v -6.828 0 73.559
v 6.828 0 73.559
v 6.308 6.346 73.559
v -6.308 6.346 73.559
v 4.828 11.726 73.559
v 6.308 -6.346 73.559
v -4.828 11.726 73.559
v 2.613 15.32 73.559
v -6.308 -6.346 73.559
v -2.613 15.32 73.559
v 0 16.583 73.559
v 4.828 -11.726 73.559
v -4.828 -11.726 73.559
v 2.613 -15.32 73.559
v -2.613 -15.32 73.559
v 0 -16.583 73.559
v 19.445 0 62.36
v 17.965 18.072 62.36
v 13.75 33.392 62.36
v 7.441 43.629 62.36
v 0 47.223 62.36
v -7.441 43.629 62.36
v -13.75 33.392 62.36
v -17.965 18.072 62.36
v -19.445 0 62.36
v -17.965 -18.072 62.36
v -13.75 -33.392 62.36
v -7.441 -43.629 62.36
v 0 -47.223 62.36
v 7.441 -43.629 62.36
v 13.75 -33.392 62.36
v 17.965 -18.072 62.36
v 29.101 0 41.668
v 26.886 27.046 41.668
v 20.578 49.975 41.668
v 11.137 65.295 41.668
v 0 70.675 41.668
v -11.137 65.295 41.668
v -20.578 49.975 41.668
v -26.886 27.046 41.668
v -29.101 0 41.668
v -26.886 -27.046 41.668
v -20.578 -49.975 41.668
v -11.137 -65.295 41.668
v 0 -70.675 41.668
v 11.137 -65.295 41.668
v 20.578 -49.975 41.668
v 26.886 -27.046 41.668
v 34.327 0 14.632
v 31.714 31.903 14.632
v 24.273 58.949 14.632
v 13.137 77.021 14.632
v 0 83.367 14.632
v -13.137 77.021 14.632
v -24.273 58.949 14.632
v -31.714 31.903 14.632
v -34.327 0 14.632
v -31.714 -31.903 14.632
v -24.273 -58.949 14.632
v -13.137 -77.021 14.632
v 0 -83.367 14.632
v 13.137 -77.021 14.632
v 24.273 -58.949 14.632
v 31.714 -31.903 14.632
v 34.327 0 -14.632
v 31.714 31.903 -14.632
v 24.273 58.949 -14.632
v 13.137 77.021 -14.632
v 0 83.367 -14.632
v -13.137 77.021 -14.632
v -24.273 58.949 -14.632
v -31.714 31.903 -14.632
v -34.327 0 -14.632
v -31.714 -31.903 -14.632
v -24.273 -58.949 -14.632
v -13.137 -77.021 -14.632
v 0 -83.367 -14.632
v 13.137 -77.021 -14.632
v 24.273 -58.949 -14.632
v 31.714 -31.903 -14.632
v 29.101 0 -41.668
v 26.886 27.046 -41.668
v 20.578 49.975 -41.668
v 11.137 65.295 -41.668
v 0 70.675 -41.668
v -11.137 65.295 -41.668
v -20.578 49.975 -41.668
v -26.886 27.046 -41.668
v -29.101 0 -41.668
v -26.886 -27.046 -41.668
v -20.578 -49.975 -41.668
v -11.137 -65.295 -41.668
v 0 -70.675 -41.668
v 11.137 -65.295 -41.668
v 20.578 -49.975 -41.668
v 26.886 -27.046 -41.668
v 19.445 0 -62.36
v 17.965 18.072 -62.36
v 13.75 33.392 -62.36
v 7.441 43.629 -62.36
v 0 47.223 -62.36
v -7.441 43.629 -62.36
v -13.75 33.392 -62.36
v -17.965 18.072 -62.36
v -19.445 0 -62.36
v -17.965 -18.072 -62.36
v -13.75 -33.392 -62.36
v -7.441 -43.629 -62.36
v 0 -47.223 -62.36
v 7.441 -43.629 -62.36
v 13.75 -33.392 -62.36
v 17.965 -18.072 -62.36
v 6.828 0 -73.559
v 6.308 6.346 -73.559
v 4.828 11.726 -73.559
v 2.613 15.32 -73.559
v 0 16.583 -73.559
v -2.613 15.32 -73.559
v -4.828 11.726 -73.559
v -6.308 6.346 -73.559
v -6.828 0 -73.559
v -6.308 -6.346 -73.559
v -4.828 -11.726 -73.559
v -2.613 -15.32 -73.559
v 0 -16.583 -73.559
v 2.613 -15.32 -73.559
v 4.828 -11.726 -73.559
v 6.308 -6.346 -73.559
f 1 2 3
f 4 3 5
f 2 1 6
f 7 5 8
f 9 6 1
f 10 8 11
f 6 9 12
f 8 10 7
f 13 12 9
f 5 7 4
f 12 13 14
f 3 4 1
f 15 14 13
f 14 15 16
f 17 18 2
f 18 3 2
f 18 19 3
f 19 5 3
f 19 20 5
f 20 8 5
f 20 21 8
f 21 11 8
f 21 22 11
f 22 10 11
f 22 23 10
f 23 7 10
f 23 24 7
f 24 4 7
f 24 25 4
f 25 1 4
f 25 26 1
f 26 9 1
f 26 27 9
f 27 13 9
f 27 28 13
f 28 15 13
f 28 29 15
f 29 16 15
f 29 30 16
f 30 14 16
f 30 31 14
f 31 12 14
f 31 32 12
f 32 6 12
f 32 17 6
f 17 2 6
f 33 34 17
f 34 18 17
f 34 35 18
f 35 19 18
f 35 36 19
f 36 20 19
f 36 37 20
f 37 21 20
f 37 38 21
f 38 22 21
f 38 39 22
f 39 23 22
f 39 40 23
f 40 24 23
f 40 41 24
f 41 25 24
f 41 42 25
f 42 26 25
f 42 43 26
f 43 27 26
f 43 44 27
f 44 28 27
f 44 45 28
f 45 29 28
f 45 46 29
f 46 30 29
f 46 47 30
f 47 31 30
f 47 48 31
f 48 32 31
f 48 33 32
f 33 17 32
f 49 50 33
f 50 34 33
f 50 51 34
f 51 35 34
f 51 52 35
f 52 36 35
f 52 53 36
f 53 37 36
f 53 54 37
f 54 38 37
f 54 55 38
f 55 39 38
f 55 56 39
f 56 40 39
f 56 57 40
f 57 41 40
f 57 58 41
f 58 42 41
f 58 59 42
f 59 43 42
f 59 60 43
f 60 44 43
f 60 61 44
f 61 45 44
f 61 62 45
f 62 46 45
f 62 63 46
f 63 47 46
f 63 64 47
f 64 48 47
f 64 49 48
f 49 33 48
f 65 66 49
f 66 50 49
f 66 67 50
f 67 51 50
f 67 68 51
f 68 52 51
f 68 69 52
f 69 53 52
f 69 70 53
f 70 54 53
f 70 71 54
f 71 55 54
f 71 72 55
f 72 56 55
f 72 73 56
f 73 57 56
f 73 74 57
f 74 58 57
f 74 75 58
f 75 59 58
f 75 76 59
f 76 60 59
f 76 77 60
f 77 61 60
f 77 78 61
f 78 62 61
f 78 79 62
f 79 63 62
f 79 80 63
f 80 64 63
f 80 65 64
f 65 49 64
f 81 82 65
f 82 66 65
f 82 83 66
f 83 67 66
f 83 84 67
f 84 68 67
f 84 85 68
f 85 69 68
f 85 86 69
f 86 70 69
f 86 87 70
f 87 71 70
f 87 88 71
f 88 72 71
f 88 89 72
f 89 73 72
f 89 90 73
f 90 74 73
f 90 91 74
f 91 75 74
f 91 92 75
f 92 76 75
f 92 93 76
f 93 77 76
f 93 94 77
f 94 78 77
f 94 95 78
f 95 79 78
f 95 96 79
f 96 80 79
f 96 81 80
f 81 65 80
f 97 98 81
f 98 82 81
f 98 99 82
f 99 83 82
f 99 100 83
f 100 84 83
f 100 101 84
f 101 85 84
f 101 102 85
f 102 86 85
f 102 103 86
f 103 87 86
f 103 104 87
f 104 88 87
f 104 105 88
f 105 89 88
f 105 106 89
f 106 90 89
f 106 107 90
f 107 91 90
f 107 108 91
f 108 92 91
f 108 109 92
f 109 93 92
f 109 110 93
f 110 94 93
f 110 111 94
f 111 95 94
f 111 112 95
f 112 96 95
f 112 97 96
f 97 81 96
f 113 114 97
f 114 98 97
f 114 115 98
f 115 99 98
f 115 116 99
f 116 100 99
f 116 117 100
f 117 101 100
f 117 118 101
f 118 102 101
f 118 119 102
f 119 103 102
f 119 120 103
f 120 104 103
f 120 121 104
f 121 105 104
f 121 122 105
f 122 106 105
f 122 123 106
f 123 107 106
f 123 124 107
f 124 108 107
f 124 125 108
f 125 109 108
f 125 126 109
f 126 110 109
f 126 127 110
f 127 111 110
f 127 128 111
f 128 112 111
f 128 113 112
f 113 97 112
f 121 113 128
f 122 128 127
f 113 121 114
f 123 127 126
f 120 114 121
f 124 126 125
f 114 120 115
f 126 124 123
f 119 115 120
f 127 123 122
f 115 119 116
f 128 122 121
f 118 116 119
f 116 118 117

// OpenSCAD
// Generated by SolidPython 1.0.1 on 2020-07-29 00:46:48


scale(v = [7, 17, 15]) {
	sphere(r = 5);
}
/***********************************************
*********      SolidPython code:      **********
************************************************
 
# import packages: SolidPython
from solid import *
from solid.utils import *
from itertools import chain, combinations, permutations


class Resize:

    def __init__(self, scad_file):
        self.scad_file = scad_file
        #self.scad_file = import_scad(scad_file)
        # cone/cylinder param:
        self.r1 = 0
        self.r2 = 0
        self.h = 0
        # rectangular prism param:
        self.w = 0
        self.l = 0
        # ellipse param:
        self.r = 0

    # import OpenScad code (file name corresponds to shape)


    # classify shape + parameters
    def assign(self, param1, param2, param3):
        if self.scad_file == 'cone.scad':
            self.r1 = param1
            self.r2 = param2
            self.h = param3
        elif self.scad_file == 'cylinder.scad':
            self.r1 = param1
            self.r2 = param2
            self.h = param3
        elif self.scad_file == 'rectangularPrism.scad':
            self.h = param1
            self.l = param2
            self.w = param3
        else:
            self.r = param1
            self.h = param2

    # resize parameters
    def iterate(self):
        x = range(3, 20, 2)
        i = 1
        if self.scad_file == 'cone.scad':
            tempList = list(permutations(x, 2))
            for temp in tempList:
                param1 = temp[0]
                param2 = temp[1]
                filepath = 'produced_scad_files/' + 'cone' + str(param1) + '_' + str(param2) + '_' + '.scad'
                scad_render_to_file(cylinder(h=param1, r1=param2, r2=0), filepath)

        elif self.scad_file == 'cylinder.scad':
            tempList = list(permutations(x, 3))
            for temp in tempList:
                param1 = temp[0]
                param2 = temp[1]
                filepath = 'produced_scad_files/' + 'cylinder' + str(param1) + '_' + str(param2) + '_' + '.scad'
                scad_render_to_file(cylinder(h=param1, r1=param2, r2=param2), filepath)

        elif self.scad_file == 'rectangularPrism.scad':
            tempList = list(permutations(x, 3))
            for temp in tempList:
                param1 = temp[0]
                param2 = temp[1]
                param3 = temp[2]
                filepath = 'produced_scad_files/' + 'rectangularPrism' + str(param1) + '_' + str(param2) + '_' + str(
                    param3) + '.scad'
                scad_render_to_file(cube(size=(param1, param2, param3)), filepath)

        elif self.scad_file == 'ellipse.scad':
            tempList = list(permutations(x, 4))
            for temp in tempList:
                param1 = temp[0]
                param2 = temp[1]
                param3 = temp[2]
                param4 = temp[3]
                filepath = 'produced_scad_files/' + 'ellipse' + str(param1) + '_' + str(param2) + '_' + str(param3) + '_' + str(param4) + '.scad'
                scad_render_to_file(scale([param1, param2, param3])(sphere(r=param4)), filepath)

    def render_to_scadfile(self):
        scad_render_to_file(scad, 'example.scad') 
 
************************************************/
